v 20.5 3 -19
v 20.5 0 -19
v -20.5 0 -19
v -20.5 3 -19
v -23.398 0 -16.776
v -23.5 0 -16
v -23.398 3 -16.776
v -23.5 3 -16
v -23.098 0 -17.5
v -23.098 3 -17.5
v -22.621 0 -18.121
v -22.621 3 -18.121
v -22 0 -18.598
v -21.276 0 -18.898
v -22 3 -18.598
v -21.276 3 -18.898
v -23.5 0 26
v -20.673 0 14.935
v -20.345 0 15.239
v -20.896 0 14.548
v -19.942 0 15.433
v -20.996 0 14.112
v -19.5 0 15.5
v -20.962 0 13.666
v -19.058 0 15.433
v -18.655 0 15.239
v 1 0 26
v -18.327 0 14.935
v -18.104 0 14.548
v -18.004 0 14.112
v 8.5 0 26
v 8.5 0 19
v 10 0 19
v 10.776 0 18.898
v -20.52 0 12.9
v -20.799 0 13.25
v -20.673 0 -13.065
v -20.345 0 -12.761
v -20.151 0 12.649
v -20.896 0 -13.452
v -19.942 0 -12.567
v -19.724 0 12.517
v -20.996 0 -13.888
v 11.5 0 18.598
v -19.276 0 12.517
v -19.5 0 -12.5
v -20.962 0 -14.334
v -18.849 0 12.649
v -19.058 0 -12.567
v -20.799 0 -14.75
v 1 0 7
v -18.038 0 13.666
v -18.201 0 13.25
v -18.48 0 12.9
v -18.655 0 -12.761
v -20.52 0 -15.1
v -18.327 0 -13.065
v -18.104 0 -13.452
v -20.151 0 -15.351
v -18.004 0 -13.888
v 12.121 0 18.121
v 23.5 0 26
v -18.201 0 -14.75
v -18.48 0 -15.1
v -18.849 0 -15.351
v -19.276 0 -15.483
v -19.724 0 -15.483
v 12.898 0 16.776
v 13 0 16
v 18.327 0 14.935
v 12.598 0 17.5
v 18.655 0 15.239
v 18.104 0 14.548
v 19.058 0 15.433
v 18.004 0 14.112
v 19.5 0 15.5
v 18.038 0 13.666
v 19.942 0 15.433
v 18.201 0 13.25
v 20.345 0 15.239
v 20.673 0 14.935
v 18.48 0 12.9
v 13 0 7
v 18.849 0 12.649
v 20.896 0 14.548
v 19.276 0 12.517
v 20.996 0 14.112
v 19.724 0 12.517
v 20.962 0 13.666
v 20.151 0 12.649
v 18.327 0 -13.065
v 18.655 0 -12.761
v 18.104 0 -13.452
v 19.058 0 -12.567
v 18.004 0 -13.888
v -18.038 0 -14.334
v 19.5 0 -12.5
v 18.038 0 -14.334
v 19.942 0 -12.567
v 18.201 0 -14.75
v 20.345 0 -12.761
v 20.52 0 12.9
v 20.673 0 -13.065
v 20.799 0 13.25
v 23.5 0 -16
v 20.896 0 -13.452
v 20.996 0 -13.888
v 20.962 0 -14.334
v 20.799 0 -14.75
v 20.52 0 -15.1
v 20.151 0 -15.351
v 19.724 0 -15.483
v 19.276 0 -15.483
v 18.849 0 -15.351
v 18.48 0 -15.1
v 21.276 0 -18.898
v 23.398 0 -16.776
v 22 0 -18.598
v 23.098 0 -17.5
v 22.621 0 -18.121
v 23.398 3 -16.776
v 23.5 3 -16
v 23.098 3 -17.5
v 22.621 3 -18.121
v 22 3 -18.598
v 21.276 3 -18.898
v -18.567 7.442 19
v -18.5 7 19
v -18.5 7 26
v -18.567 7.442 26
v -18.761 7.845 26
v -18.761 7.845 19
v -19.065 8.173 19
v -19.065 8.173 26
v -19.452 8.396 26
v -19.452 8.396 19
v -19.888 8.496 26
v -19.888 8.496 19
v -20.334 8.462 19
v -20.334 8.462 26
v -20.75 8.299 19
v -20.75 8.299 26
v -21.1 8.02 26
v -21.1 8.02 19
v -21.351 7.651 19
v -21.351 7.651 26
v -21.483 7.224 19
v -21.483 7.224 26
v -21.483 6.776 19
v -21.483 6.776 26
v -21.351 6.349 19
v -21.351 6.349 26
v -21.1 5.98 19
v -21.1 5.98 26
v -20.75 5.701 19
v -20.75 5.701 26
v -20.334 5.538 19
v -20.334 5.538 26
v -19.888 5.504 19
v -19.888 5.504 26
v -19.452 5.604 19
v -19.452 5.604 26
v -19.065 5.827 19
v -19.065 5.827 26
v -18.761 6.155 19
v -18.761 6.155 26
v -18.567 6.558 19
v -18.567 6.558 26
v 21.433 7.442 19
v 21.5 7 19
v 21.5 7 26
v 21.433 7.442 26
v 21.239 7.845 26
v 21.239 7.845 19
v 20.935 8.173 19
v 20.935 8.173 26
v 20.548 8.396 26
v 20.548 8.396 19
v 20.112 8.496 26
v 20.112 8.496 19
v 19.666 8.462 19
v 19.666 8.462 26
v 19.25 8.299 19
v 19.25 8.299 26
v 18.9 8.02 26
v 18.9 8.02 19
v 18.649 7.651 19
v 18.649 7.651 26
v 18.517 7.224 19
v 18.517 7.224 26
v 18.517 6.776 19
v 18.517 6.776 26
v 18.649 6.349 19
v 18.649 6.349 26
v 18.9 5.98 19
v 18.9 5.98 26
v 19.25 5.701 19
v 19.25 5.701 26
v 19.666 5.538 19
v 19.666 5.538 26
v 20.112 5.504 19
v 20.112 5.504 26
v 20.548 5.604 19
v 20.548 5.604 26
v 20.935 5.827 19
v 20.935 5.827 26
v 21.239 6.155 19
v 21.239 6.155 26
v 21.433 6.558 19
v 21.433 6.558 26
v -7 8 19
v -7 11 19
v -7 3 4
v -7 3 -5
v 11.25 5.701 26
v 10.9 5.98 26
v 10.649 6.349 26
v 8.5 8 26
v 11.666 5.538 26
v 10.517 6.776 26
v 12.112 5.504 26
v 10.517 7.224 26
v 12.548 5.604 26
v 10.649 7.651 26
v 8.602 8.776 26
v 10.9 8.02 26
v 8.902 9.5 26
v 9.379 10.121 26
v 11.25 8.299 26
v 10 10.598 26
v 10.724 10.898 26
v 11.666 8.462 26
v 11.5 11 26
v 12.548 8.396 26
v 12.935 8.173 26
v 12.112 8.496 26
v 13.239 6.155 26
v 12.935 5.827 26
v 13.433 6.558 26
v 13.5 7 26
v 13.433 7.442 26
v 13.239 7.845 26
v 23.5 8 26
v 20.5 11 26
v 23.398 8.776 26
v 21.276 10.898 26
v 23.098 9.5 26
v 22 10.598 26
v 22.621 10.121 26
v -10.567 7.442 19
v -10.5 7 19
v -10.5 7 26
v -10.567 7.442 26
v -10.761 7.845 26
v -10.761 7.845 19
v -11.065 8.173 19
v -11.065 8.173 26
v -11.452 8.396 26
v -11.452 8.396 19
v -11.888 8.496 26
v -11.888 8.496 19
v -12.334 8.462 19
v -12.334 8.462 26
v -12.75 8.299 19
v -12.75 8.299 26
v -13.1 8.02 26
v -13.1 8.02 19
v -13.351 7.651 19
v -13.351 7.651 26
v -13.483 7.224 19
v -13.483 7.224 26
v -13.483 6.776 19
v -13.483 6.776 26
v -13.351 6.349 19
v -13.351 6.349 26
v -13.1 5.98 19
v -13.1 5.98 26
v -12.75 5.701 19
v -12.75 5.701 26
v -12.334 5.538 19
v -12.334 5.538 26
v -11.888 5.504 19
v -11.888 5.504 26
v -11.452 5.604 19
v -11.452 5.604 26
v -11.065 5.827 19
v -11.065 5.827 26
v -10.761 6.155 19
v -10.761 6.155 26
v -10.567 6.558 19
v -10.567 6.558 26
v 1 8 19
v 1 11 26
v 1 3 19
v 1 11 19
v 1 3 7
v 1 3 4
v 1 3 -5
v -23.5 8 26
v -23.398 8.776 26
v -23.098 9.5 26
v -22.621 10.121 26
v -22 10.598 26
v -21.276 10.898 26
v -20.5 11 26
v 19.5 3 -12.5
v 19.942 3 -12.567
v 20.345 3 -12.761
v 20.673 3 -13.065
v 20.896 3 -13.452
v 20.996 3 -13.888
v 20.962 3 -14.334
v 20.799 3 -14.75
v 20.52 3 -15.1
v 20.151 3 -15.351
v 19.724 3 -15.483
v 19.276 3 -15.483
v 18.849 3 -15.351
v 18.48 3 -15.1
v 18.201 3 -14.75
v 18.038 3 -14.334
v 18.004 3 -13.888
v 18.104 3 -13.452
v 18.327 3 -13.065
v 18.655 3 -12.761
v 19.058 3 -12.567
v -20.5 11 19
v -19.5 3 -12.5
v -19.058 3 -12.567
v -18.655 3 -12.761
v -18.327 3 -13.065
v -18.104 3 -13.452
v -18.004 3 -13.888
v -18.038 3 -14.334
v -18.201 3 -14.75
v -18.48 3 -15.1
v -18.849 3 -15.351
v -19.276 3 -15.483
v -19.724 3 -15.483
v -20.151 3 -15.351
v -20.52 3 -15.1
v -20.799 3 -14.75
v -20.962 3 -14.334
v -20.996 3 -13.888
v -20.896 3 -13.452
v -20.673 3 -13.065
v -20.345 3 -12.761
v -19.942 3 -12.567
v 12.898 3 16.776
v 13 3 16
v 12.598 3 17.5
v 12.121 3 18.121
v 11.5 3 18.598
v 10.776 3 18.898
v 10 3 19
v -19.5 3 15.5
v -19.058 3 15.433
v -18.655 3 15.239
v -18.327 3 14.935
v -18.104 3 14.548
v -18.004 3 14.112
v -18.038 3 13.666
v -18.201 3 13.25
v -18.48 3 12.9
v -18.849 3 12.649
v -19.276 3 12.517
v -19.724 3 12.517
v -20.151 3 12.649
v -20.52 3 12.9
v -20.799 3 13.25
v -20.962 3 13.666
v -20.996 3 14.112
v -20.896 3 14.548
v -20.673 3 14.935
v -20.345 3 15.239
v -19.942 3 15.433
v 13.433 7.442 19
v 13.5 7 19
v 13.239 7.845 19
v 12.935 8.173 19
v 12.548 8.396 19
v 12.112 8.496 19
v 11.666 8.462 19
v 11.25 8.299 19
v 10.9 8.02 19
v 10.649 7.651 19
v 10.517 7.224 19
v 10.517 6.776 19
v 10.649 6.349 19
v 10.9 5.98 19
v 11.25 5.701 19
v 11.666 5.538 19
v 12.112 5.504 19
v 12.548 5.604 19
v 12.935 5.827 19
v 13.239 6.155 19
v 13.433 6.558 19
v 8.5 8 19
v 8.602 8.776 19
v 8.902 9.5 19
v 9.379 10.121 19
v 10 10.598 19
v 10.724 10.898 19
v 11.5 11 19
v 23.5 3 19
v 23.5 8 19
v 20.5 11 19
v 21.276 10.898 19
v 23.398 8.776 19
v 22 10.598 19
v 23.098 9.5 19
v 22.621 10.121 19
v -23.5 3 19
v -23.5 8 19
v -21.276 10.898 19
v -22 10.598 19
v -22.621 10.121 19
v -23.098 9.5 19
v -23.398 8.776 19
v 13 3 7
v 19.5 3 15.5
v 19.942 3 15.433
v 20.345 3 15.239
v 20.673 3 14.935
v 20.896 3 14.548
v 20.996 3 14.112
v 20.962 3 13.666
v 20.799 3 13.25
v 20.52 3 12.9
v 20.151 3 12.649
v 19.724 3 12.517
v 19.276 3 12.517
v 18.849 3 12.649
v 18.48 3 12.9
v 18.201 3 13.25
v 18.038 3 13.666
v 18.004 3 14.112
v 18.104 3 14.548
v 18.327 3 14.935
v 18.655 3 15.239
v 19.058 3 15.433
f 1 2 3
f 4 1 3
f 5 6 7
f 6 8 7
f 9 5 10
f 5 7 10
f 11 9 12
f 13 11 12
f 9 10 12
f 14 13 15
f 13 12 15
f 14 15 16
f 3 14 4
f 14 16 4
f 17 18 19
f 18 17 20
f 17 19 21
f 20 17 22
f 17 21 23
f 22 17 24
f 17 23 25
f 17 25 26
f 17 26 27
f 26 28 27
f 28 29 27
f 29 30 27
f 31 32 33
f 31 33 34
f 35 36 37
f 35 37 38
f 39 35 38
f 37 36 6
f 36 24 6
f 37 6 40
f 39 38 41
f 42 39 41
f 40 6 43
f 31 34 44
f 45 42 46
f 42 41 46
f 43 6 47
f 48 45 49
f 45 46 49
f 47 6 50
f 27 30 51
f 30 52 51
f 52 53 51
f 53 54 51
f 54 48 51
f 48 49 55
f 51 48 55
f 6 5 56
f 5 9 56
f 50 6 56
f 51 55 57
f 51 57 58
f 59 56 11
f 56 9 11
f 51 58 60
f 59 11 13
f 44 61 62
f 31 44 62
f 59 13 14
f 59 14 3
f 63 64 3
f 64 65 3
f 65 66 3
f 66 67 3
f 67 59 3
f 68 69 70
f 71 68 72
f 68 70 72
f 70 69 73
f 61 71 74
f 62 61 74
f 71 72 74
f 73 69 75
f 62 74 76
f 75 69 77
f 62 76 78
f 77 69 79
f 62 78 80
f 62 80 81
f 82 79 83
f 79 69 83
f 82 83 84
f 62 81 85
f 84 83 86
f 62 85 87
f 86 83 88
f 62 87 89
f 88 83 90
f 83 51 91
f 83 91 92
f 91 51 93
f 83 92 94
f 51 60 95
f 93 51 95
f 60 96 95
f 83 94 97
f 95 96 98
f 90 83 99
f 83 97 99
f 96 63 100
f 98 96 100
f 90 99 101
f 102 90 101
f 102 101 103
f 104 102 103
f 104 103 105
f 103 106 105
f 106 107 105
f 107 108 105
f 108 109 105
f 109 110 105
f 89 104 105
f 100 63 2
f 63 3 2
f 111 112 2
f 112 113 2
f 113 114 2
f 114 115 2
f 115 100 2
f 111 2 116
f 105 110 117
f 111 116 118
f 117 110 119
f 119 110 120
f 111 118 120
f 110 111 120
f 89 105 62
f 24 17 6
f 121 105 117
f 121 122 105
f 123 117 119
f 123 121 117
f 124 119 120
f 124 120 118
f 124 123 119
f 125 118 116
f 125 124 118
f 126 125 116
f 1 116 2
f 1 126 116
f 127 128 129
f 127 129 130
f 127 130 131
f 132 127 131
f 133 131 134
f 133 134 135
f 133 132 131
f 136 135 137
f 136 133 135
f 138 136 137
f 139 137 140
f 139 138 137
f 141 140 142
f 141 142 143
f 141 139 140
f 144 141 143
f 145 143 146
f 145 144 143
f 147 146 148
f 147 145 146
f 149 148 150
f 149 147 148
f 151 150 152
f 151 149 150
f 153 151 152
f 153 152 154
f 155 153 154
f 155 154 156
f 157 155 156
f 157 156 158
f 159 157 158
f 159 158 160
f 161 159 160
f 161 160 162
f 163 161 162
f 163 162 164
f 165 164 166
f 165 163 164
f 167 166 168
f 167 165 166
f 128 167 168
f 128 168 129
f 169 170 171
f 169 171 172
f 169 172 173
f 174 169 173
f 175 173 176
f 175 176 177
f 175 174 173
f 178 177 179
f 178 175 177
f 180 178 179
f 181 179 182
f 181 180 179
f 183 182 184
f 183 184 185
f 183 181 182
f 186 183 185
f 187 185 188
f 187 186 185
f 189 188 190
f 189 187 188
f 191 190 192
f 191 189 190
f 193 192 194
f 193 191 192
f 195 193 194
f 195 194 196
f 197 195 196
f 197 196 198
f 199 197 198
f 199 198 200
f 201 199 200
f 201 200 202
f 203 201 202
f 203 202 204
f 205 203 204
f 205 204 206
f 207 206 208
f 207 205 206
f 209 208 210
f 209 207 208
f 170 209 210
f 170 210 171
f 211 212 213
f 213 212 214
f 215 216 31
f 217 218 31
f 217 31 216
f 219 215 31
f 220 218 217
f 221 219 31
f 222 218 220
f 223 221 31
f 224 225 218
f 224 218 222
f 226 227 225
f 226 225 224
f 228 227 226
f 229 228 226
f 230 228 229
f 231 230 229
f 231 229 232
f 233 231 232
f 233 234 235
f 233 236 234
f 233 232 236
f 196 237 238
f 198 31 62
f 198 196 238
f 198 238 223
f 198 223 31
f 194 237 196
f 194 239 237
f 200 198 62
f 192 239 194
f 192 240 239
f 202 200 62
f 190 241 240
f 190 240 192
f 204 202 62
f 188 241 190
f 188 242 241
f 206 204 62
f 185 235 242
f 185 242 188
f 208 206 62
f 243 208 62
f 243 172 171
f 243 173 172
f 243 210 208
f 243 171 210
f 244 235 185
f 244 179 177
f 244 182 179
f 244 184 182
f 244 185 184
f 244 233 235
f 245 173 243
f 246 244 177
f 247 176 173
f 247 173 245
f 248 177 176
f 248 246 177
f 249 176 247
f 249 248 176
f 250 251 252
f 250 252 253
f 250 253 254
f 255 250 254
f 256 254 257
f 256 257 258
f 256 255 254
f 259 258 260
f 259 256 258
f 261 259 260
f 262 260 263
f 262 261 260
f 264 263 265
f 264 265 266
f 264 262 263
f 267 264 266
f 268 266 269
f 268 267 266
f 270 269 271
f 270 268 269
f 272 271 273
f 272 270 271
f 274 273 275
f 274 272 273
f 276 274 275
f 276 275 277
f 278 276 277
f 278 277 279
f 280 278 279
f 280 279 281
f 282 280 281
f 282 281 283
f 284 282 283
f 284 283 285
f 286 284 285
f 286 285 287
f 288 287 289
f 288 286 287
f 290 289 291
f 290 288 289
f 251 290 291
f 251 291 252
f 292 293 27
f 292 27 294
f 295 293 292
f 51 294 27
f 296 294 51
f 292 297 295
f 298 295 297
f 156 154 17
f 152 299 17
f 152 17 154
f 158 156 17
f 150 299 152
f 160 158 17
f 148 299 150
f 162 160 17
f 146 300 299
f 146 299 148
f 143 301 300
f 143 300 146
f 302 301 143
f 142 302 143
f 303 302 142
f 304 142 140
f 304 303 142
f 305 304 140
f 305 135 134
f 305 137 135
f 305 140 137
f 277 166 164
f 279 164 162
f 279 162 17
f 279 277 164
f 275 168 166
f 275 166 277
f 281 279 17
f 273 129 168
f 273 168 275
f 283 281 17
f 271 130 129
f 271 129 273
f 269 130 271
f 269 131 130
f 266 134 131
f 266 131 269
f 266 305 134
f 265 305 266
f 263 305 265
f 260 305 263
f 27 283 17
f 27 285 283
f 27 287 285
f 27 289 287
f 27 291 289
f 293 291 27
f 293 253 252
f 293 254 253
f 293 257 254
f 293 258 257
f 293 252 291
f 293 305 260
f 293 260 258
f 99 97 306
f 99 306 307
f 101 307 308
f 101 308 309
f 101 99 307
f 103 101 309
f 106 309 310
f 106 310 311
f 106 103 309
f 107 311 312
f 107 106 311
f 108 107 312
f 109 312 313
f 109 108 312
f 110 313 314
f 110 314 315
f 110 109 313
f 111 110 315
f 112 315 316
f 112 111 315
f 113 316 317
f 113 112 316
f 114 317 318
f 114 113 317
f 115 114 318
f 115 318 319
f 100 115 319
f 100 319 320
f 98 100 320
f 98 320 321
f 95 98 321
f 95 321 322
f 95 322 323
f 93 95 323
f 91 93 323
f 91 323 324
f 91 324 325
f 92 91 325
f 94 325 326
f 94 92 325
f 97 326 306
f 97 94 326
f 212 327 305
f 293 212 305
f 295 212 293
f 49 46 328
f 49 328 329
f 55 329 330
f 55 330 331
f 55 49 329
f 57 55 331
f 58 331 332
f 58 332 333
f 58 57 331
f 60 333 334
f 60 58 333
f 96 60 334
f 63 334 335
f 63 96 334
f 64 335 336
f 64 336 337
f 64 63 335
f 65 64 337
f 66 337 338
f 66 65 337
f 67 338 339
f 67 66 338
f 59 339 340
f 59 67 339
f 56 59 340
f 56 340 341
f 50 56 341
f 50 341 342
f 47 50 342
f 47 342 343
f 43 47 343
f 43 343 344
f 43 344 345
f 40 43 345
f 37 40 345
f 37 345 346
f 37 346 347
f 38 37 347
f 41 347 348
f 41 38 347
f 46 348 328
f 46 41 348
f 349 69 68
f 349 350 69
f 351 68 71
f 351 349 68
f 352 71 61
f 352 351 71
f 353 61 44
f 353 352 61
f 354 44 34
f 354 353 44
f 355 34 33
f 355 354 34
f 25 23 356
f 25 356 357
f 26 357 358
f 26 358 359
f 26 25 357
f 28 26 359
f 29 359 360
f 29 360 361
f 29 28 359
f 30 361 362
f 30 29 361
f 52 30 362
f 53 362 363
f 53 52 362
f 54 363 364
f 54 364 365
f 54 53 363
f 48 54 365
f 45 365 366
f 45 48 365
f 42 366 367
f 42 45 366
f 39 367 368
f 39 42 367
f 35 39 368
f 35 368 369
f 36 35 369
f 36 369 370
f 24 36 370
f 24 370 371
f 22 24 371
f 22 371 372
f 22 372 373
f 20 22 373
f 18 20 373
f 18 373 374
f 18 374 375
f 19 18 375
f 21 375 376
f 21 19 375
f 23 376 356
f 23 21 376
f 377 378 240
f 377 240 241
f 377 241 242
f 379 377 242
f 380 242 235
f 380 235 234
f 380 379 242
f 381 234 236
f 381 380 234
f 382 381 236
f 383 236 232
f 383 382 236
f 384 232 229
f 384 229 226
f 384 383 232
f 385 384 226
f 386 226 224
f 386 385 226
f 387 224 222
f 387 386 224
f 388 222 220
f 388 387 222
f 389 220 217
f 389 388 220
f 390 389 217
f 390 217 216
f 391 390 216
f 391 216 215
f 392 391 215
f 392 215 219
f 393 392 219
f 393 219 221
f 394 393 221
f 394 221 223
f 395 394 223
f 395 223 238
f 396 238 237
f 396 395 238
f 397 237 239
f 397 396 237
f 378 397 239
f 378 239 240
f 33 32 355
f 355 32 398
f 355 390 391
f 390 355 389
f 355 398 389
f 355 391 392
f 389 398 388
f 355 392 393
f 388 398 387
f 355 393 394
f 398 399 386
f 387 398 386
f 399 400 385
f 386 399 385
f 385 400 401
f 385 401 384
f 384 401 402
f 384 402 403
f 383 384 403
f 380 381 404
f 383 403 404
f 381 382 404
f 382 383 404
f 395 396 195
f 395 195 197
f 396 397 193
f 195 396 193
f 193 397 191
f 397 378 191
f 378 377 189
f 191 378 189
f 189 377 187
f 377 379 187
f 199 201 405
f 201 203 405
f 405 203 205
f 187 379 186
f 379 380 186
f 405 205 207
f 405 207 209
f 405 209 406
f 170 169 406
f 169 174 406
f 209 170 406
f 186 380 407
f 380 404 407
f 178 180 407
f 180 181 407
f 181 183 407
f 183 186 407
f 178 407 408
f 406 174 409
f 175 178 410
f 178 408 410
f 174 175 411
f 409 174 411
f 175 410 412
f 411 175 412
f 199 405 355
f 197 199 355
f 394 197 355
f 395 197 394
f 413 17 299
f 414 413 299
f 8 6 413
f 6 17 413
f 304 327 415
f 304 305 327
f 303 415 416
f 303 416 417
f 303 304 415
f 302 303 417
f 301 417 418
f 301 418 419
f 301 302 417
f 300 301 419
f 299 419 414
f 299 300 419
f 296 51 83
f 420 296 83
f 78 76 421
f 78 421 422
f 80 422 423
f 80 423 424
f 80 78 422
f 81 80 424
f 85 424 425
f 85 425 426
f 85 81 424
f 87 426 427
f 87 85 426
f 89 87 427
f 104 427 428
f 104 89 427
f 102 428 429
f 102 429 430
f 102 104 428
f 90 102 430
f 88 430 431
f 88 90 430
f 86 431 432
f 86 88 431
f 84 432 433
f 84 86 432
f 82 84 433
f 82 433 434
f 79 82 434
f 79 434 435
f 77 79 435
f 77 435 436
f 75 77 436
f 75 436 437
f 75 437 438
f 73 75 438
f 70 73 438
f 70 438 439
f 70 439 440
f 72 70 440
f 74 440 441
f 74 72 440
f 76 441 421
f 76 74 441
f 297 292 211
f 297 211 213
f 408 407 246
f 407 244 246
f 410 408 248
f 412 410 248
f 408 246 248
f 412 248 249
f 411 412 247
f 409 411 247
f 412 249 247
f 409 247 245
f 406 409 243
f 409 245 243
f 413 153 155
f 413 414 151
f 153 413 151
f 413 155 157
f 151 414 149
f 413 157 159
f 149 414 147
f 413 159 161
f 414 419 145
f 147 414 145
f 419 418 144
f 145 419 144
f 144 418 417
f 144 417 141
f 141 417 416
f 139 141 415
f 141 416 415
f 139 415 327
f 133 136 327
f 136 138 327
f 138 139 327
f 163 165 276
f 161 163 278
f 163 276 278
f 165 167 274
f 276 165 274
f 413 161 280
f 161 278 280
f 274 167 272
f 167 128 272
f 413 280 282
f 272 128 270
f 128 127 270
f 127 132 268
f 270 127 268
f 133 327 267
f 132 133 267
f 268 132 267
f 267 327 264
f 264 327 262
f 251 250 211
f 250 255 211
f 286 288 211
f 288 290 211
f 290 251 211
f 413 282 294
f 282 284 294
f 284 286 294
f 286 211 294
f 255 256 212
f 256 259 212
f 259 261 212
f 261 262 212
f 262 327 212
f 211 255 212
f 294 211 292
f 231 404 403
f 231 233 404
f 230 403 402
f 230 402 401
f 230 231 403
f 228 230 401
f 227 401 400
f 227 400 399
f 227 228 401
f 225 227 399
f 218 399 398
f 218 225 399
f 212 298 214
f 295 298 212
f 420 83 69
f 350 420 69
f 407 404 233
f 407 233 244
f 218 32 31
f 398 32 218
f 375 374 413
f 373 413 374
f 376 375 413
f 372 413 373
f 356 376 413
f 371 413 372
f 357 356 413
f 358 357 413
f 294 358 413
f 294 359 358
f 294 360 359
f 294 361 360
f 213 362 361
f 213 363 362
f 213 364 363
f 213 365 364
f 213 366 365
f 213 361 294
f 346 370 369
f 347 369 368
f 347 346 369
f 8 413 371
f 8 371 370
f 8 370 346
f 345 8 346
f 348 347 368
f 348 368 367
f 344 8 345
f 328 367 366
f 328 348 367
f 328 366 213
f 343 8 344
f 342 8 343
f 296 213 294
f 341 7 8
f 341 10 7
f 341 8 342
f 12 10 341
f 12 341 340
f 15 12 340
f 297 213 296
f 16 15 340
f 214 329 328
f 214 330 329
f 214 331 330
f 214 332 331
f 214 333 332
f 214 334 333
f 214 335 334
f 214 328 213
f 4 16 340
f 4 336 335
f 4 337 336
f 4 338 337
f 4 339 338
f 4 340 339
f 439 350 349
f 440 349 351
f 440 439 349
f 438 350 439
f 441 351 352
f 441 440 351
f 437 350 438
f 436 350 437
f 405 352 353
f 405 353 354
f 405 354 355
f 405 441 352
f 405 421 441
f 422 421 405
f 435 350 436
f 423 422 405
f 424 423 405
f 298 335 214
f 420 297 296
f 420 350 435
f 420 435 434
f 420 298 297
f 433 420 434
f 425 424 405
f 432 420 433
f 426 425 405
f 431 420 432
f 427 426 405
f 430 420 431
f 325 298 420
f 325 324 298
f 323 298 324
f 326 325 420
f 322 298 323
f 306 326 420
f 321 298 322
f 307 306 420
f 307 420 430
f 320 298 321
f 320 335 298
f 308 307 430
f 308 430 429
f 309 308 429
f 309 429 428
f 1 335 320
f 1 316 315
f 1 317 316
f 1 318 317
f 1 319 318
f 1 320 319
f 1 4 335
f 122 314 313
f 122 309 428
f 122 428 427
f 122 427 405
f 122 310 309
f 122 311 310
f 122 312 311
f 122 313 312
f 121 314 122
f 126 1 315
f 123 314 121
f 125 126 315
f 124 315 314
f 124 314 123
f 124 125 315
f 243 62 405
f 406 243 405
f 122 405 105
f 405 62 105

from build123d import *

# Parameters (mm, degrees)
SKETCH_1_R      = 1.5
EXTRUDE_1_DEPTH = 3
SKETCH_2_W      = 23.5
SKETCH_2_H      = 11
SKETCH_2_R      = 1.5
SKETCH_2_W_2    = 1
SKETCH_2_W_3    = 15
EXTRUDE_2_DEPTH = 7
FILLET_2_R      = 3
EXTRUDE_3_DEPTH = 8
FILLET_3_R      = 3
FILLET_4_R      = 3


with BuildPart() as part:
    # 草图1 → 凸台-拉伸1 (new body)
    with BuildSketch(Plane(origin=(0, 0, 0), x_dir=(1, 0, 0), z_dir=(0, 1, 0))):
        Polygon((-23.5, 19), (-23.5, -19), (1, -19), (1, -7), (13, -7), (13, -19), (23.5, -19), (23.5, 19), align=None)
        with Locations(Location((-19.5, -14, 0), (0, 0, 270))):
            Circle(SKETCH_1_R, mode=Mode.SUBTRACT)
        with Locations(Location((19.5, -14, 0), (0, 0, 270))):
            Circle(SKETCH_1_R, mode=Mode.SUBTRACT)
        with Locations(Location((-19.5, 14, 0), (0, 0, 270))):
            Circle(SKETCH_1_R, mode=Mode.SUBTRACT)
        with Locations(Location((19.5, 14, 0), (0, 0, 270))):
            Circle(SKETCH_1_R, mode=Mode.SUBTRACT)
    extrude(amount=EXTRUDE_1_DEPTH)

    # 草图2 → 凸台-拉伸2 (add)
    # profile 1 of 3: a face of its own
    with BuildSketch(Plane.XY.offset(19)):
        with Locations((-11.75, 5.5)):
            Rectangle(SKETCH_2_W, SKETCH_2_H)
        with Locations((-20, 7)):
            Circle(SKETCH_2_R, mode=Mode.SUBTRACT)
        with Locations((-12, 7)):
            Circle(SKETCH_2_R, mode=Mode.SUBTRACT)
    # profile 2 of 3: a face of its own
    with BuildSketch(Plane.XY.offset(19)):
        with Locations((0.5, 5.5)):
            Rectangle(SKETCH_2_W_2, SKETCH_2_H)
    # profile 3 of 3: a face of its own
    with BuildSketch(Plane.XY.offset(19)):
        with Locations((16, 5.5)):
            Rectangle(SKETCH_2_W_3, SKETCH_2_H)
        with Locations((12, 7)):
            Circle(SKETCH_2_R, mode=Mode.SUBTRACT)
        with Locations((20, 7)):
            Circle(SKETCH_2_R, mode=Mode.SUBTRACT)
    extrude(amount=EXTRUDE_2_DEPTH)

    # 圆角2
    fillet_2_edges = [part.edges().sort_by_distance(p)[0] for p in [
        (-23.5, 1.5, -19),
        (23.5, 1.5, -19),
    ]]
    fillet(fillet_2_edges, radius=FILLET_2_R)

    # 草图3 → 凸台-拉伸3 (add)
    with BuildSketch(Plane(origin=(1, 0, 0), x_dir=(0, 0, -1), z_dir=(1, 0, 0))):
        Polygon((-19, 11), (-19, 8), (-4, 3), (5, 3), align=None)
    extrude(amount=-EXTRUDE_3_DEPTH)

    # 圆角3
    fillet_3_edges = [part.edges().sort_by_distance(p)[0] for p in [
        (13, 1.5, 19),
    ]]
    fillet(fillet_3_edges, radius=FILLET_3_R)

    # 圆角4
    fillet_4_edges = [part.edges().sort_by_distance(p)[0] for p in [
        (-23.5, 11, 22.5),
        (23.5, 11, 22.5),
        (8.5, 11, 22.5),
    ]]
    fillet(fillet_4_edges, radius=FILLET_4_R)


solid = part.part
